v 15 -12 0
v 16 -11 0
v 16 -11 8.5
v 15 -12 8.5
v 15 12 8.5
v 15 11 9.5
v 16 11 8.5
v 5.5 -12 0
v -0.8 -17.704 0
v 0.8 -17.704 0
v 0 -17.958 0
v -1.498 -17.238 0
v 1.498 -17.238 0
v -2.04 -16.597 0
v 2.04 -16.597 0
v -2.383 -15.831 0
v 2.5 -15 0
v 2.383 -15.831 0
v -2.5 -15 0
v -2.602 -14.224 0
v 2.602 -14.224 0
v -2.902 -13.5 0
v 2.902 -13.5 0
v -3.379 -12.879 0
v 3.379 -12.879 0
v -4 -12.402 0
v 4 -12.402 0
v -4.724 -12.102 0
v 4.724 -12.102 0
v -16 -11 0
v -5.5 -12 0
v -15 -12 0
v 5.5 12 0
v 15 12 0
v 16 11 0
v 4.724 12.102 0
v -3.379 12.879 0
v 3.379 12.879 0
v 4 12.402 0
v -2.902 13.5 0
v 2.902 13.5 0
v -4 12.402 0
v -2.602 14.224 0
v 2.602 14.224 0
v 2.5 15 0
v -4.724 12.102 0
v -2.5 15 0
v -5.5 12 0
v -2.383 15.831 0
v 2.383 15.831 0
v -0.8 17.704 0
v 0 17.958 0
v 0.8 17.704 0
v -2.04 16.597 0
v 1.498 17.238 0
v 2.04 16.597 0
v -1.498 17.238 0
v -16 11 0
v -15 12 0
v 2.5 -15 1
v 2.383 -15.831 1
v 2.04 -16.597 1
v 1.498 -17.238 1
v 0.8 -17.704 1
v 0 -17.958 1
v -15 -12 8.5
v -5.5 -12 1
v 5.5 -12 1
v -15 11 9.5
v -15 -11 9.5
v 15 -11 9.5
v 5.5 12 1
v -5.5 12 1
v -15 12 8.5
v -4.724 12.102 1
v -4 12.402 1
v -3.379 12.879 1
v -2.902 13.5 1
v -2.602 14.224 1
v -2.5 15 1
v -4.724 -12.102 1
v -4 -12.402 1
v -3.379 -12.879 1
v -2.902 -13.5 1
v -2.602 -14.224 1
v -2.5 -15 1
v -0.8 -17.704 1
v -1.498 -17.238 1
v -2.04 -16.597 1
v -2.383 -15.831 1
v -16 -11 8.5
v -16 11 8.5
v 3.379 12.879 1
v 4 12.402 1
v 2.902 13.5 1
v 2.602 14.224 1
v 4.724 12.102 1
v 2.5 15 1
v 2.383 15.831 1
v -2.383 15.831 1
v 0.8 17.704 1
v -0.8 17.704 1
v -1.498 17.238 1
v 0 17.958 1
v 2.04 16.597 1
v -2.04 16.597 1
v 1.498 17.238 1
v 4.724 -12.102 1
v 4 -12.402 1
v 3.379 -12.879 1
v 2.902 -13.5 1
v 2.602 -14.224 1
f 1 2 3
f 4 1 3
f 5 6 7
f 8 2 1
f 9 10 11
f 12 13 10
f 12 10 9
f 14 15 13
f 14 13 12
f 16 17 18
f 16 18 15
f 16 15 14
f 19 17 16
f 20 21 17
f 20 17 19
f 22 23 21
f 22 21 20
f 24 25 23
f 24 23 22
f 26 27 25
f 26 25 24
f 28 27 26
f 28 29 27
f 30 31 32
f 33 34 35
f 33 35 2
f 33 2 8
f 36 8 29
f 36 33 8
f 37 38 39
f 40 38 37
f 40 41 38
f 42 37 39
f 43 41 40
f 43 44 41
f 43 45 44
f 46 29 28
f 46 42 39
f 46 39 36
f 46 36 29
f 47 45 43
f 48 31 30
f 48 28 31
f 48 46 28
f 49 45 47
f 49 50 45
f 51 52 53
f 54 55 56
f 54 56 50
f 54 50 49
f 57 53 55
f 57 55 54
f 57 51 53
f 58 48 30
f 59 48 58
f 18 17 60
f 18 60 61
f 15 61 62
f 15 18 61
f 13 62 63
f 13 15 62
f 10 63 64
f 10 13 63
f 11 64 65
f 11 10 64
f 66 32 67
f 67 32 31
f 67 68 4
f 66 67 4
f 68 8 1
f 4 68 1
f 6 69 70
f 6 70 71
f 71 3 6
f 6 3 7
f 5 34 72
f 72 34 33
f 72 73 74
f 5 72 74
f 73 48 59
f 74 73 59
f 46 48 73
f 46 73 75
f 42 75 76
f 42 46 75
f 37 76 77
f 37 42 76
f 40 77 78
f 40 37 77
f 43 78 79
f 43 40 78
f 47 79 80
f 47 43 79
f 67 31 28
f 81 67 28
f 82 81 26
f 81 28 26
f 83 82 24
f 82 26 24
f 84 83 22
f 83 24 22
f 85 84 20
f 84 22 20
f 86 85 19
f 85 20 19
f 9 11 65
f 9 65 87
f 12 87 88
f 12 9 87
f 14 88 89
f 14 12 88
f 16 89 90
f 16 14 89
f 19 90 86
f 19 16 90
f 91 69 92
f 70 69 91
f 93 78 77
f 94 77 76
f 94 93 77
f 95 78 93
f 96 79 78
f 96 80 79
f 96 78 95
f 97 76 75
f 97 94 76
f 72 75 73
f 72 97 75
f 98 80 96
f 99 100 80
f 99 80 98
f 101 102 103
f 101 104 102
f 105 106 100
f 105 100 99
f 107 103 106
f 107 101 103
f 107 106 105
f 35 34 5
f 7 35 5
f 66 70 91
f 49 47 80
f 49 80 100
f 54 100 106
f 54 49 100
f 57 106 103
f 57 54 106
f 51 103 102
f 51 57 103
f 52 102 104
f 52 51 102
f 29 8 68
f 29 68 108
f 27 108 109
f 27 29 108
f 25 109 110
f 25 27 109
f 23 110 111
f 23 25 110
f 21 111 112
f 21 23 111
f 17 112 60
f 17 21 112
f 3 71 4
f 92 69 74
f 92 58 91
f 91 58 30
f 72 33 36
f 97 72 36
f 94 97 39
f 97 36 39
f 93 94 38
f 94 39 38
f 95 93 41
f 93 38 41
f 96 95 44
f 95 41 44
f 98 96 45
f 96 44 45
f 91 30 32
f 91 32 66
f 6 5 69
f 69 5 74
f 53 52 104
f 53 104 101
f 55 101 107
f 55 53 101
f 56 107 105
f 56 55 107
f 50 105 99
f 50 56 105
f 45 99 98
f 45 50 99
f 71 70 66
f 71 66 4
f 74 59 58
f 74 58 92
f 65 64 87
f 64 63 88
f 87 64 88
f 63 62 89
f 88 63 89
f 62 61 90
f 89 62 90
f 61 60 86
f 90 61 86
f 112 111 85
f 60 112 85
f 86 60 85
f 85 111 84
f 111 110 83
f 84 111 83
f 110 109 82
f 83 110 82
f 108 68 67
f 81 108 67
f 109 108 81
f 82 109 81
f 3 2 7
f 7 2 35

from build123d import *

# Parameters (mm, degrees)
F0_W        = 5
F0_H        = 6
F1_DEPTH    = 9.5
F2_DEPTH    = 1
F3_T1_DEPTH = 1
F3_T3_DEPTH = 16
F4_SIZE     = 1


# Not quite as in the source:
# - a fillet or chamfer that OpenCascade refuses, or shapes differently, is made with other operations: its cross-section is extruded or revolved along the edge and cut away or added


with BuildPart() as f1:
    # F0 (on Top) → F1 (new body)
    with BuildSketch(Plane.XY):
        Polygon((16, -12), (16, 12), (2.5, 12), (2.5, 6), (-2.5, 6), (-2.5, 12), (-16, 12), (-16, -12), (-2.5, -12), (-2.5, -6), (2.5, -6), (2.5, -12), align=None)
        with Locations((0, -9)):
            Rectangle(F0_W, F0_H)
        with Locations((0, 9)):
            Rectangle(F0_W, F0_H)
    extrude(amount=F1_DEPTH)

    # F0 (on Top) → F2 (join)
    with BuildSketch(Plane.XY):
        with Locations((0, 15)):
            Rectangle(F0_W, F0_H)
        with Locations((0, -15)):
            Rectangle(F0_W, F0_H)
    extrude(amount=F2_DEPTH)

    # F3: fillet of radius 3 on 8 edges, made by hand

    # F3_s2 → F3_t1 (join)
    with BuildSketch(Plane.XY):
        with BuildLine():
            ThreePointArc((5.5, -12), (3.3786796564, -12.8786796564), (2.5, -15))
            Line((2.5, -15), (2.5, -12))
            Line((2.5, -12), (5.5, -12))
        make_face()
        with BuildLine():
            ThreePointArc((-5.5, -12), (-3.3786796564, -12.8786796564), (-2.5, -15))
            Line((-2.5, -15), (-2.5, -12))
            Line((-2.5, -12), (-5.5, -12))
        make_face()
        with BuildLine():
            ThreePointArc((-5.5, 12), (-3.3786796564, 12.8786796564), (-2.5, 15))
            Line((-2.5, 15), (-2.5, 12))
            Line((-2.5, 12), (-5.5, 12))
        make_face()
        with BuildLine():
            ThreePointArc((5.5, 12), (3.3786796564, 12.8786796564), (2.5, 15))
            Line((2.5, 15), (2.5, 12))
            Line((2.5, 12), (5.5, 12))
        make_face()
    extrude(amount=F3_T1_DEPTH)

    # F3_s4 → F3_t3 (cut)
    with BuildSketch(Plane.XY.offset(-7.5)):
        with BuildLine():
            ThreePointArc((0.5, -18), (-1.6213203436, -17.1213203436), (-2.5, -15))
            Line((-2.5, -15), (-2.5, -18))
            Line((-2.5, -18), (0.5, -18))
        make_face()
        with BuildLine():
            ThreePointArc((2.5, -15), (1.6213203436, -17.1213203436), (-0.5, -18))
            Line((-0.5, -18), (2.5, -18))
            Line((2.5, -18), (2.5, -15))
        make_face()
        with BuildLine():
            ThreePointArc((-2.5, 15), (-1.6213203436, 17.1213203436), (0.5, 18))
            Line((0.5, 18), (-2.5, 18))
            Line((-2.5, 18), (-2.5, 15))
        make_face()
        with BuildLine():
            ThreePointArc((-0.5, 18), (1.6213203436, 17.1213203436), (2.5, 15))
            Line((2.5, 15), (2.5, 18))
            Line((2.5, 18), (-0.5, 18))
        make_face()
    extrude(amount=F3_T3_DEPTH, mode=Mode.SUBTRACT)

    # F4
    f4_edges = [f1.edges().sort_by_distance(p)[0] for p in [
        (-16, 0, 9.5),
        (0, 12, 9.5),
        (0, -12, 9.5),
        (16, 0, 9.5),
        (-16, 12, 4.75),
        (-16, -12, 4.75),
        (16, -12, 4.75),
        (16, 12, 4.75),
    ]]
    chamfer(f4_edges, length=F4_SIZE)


solid = f1.part
